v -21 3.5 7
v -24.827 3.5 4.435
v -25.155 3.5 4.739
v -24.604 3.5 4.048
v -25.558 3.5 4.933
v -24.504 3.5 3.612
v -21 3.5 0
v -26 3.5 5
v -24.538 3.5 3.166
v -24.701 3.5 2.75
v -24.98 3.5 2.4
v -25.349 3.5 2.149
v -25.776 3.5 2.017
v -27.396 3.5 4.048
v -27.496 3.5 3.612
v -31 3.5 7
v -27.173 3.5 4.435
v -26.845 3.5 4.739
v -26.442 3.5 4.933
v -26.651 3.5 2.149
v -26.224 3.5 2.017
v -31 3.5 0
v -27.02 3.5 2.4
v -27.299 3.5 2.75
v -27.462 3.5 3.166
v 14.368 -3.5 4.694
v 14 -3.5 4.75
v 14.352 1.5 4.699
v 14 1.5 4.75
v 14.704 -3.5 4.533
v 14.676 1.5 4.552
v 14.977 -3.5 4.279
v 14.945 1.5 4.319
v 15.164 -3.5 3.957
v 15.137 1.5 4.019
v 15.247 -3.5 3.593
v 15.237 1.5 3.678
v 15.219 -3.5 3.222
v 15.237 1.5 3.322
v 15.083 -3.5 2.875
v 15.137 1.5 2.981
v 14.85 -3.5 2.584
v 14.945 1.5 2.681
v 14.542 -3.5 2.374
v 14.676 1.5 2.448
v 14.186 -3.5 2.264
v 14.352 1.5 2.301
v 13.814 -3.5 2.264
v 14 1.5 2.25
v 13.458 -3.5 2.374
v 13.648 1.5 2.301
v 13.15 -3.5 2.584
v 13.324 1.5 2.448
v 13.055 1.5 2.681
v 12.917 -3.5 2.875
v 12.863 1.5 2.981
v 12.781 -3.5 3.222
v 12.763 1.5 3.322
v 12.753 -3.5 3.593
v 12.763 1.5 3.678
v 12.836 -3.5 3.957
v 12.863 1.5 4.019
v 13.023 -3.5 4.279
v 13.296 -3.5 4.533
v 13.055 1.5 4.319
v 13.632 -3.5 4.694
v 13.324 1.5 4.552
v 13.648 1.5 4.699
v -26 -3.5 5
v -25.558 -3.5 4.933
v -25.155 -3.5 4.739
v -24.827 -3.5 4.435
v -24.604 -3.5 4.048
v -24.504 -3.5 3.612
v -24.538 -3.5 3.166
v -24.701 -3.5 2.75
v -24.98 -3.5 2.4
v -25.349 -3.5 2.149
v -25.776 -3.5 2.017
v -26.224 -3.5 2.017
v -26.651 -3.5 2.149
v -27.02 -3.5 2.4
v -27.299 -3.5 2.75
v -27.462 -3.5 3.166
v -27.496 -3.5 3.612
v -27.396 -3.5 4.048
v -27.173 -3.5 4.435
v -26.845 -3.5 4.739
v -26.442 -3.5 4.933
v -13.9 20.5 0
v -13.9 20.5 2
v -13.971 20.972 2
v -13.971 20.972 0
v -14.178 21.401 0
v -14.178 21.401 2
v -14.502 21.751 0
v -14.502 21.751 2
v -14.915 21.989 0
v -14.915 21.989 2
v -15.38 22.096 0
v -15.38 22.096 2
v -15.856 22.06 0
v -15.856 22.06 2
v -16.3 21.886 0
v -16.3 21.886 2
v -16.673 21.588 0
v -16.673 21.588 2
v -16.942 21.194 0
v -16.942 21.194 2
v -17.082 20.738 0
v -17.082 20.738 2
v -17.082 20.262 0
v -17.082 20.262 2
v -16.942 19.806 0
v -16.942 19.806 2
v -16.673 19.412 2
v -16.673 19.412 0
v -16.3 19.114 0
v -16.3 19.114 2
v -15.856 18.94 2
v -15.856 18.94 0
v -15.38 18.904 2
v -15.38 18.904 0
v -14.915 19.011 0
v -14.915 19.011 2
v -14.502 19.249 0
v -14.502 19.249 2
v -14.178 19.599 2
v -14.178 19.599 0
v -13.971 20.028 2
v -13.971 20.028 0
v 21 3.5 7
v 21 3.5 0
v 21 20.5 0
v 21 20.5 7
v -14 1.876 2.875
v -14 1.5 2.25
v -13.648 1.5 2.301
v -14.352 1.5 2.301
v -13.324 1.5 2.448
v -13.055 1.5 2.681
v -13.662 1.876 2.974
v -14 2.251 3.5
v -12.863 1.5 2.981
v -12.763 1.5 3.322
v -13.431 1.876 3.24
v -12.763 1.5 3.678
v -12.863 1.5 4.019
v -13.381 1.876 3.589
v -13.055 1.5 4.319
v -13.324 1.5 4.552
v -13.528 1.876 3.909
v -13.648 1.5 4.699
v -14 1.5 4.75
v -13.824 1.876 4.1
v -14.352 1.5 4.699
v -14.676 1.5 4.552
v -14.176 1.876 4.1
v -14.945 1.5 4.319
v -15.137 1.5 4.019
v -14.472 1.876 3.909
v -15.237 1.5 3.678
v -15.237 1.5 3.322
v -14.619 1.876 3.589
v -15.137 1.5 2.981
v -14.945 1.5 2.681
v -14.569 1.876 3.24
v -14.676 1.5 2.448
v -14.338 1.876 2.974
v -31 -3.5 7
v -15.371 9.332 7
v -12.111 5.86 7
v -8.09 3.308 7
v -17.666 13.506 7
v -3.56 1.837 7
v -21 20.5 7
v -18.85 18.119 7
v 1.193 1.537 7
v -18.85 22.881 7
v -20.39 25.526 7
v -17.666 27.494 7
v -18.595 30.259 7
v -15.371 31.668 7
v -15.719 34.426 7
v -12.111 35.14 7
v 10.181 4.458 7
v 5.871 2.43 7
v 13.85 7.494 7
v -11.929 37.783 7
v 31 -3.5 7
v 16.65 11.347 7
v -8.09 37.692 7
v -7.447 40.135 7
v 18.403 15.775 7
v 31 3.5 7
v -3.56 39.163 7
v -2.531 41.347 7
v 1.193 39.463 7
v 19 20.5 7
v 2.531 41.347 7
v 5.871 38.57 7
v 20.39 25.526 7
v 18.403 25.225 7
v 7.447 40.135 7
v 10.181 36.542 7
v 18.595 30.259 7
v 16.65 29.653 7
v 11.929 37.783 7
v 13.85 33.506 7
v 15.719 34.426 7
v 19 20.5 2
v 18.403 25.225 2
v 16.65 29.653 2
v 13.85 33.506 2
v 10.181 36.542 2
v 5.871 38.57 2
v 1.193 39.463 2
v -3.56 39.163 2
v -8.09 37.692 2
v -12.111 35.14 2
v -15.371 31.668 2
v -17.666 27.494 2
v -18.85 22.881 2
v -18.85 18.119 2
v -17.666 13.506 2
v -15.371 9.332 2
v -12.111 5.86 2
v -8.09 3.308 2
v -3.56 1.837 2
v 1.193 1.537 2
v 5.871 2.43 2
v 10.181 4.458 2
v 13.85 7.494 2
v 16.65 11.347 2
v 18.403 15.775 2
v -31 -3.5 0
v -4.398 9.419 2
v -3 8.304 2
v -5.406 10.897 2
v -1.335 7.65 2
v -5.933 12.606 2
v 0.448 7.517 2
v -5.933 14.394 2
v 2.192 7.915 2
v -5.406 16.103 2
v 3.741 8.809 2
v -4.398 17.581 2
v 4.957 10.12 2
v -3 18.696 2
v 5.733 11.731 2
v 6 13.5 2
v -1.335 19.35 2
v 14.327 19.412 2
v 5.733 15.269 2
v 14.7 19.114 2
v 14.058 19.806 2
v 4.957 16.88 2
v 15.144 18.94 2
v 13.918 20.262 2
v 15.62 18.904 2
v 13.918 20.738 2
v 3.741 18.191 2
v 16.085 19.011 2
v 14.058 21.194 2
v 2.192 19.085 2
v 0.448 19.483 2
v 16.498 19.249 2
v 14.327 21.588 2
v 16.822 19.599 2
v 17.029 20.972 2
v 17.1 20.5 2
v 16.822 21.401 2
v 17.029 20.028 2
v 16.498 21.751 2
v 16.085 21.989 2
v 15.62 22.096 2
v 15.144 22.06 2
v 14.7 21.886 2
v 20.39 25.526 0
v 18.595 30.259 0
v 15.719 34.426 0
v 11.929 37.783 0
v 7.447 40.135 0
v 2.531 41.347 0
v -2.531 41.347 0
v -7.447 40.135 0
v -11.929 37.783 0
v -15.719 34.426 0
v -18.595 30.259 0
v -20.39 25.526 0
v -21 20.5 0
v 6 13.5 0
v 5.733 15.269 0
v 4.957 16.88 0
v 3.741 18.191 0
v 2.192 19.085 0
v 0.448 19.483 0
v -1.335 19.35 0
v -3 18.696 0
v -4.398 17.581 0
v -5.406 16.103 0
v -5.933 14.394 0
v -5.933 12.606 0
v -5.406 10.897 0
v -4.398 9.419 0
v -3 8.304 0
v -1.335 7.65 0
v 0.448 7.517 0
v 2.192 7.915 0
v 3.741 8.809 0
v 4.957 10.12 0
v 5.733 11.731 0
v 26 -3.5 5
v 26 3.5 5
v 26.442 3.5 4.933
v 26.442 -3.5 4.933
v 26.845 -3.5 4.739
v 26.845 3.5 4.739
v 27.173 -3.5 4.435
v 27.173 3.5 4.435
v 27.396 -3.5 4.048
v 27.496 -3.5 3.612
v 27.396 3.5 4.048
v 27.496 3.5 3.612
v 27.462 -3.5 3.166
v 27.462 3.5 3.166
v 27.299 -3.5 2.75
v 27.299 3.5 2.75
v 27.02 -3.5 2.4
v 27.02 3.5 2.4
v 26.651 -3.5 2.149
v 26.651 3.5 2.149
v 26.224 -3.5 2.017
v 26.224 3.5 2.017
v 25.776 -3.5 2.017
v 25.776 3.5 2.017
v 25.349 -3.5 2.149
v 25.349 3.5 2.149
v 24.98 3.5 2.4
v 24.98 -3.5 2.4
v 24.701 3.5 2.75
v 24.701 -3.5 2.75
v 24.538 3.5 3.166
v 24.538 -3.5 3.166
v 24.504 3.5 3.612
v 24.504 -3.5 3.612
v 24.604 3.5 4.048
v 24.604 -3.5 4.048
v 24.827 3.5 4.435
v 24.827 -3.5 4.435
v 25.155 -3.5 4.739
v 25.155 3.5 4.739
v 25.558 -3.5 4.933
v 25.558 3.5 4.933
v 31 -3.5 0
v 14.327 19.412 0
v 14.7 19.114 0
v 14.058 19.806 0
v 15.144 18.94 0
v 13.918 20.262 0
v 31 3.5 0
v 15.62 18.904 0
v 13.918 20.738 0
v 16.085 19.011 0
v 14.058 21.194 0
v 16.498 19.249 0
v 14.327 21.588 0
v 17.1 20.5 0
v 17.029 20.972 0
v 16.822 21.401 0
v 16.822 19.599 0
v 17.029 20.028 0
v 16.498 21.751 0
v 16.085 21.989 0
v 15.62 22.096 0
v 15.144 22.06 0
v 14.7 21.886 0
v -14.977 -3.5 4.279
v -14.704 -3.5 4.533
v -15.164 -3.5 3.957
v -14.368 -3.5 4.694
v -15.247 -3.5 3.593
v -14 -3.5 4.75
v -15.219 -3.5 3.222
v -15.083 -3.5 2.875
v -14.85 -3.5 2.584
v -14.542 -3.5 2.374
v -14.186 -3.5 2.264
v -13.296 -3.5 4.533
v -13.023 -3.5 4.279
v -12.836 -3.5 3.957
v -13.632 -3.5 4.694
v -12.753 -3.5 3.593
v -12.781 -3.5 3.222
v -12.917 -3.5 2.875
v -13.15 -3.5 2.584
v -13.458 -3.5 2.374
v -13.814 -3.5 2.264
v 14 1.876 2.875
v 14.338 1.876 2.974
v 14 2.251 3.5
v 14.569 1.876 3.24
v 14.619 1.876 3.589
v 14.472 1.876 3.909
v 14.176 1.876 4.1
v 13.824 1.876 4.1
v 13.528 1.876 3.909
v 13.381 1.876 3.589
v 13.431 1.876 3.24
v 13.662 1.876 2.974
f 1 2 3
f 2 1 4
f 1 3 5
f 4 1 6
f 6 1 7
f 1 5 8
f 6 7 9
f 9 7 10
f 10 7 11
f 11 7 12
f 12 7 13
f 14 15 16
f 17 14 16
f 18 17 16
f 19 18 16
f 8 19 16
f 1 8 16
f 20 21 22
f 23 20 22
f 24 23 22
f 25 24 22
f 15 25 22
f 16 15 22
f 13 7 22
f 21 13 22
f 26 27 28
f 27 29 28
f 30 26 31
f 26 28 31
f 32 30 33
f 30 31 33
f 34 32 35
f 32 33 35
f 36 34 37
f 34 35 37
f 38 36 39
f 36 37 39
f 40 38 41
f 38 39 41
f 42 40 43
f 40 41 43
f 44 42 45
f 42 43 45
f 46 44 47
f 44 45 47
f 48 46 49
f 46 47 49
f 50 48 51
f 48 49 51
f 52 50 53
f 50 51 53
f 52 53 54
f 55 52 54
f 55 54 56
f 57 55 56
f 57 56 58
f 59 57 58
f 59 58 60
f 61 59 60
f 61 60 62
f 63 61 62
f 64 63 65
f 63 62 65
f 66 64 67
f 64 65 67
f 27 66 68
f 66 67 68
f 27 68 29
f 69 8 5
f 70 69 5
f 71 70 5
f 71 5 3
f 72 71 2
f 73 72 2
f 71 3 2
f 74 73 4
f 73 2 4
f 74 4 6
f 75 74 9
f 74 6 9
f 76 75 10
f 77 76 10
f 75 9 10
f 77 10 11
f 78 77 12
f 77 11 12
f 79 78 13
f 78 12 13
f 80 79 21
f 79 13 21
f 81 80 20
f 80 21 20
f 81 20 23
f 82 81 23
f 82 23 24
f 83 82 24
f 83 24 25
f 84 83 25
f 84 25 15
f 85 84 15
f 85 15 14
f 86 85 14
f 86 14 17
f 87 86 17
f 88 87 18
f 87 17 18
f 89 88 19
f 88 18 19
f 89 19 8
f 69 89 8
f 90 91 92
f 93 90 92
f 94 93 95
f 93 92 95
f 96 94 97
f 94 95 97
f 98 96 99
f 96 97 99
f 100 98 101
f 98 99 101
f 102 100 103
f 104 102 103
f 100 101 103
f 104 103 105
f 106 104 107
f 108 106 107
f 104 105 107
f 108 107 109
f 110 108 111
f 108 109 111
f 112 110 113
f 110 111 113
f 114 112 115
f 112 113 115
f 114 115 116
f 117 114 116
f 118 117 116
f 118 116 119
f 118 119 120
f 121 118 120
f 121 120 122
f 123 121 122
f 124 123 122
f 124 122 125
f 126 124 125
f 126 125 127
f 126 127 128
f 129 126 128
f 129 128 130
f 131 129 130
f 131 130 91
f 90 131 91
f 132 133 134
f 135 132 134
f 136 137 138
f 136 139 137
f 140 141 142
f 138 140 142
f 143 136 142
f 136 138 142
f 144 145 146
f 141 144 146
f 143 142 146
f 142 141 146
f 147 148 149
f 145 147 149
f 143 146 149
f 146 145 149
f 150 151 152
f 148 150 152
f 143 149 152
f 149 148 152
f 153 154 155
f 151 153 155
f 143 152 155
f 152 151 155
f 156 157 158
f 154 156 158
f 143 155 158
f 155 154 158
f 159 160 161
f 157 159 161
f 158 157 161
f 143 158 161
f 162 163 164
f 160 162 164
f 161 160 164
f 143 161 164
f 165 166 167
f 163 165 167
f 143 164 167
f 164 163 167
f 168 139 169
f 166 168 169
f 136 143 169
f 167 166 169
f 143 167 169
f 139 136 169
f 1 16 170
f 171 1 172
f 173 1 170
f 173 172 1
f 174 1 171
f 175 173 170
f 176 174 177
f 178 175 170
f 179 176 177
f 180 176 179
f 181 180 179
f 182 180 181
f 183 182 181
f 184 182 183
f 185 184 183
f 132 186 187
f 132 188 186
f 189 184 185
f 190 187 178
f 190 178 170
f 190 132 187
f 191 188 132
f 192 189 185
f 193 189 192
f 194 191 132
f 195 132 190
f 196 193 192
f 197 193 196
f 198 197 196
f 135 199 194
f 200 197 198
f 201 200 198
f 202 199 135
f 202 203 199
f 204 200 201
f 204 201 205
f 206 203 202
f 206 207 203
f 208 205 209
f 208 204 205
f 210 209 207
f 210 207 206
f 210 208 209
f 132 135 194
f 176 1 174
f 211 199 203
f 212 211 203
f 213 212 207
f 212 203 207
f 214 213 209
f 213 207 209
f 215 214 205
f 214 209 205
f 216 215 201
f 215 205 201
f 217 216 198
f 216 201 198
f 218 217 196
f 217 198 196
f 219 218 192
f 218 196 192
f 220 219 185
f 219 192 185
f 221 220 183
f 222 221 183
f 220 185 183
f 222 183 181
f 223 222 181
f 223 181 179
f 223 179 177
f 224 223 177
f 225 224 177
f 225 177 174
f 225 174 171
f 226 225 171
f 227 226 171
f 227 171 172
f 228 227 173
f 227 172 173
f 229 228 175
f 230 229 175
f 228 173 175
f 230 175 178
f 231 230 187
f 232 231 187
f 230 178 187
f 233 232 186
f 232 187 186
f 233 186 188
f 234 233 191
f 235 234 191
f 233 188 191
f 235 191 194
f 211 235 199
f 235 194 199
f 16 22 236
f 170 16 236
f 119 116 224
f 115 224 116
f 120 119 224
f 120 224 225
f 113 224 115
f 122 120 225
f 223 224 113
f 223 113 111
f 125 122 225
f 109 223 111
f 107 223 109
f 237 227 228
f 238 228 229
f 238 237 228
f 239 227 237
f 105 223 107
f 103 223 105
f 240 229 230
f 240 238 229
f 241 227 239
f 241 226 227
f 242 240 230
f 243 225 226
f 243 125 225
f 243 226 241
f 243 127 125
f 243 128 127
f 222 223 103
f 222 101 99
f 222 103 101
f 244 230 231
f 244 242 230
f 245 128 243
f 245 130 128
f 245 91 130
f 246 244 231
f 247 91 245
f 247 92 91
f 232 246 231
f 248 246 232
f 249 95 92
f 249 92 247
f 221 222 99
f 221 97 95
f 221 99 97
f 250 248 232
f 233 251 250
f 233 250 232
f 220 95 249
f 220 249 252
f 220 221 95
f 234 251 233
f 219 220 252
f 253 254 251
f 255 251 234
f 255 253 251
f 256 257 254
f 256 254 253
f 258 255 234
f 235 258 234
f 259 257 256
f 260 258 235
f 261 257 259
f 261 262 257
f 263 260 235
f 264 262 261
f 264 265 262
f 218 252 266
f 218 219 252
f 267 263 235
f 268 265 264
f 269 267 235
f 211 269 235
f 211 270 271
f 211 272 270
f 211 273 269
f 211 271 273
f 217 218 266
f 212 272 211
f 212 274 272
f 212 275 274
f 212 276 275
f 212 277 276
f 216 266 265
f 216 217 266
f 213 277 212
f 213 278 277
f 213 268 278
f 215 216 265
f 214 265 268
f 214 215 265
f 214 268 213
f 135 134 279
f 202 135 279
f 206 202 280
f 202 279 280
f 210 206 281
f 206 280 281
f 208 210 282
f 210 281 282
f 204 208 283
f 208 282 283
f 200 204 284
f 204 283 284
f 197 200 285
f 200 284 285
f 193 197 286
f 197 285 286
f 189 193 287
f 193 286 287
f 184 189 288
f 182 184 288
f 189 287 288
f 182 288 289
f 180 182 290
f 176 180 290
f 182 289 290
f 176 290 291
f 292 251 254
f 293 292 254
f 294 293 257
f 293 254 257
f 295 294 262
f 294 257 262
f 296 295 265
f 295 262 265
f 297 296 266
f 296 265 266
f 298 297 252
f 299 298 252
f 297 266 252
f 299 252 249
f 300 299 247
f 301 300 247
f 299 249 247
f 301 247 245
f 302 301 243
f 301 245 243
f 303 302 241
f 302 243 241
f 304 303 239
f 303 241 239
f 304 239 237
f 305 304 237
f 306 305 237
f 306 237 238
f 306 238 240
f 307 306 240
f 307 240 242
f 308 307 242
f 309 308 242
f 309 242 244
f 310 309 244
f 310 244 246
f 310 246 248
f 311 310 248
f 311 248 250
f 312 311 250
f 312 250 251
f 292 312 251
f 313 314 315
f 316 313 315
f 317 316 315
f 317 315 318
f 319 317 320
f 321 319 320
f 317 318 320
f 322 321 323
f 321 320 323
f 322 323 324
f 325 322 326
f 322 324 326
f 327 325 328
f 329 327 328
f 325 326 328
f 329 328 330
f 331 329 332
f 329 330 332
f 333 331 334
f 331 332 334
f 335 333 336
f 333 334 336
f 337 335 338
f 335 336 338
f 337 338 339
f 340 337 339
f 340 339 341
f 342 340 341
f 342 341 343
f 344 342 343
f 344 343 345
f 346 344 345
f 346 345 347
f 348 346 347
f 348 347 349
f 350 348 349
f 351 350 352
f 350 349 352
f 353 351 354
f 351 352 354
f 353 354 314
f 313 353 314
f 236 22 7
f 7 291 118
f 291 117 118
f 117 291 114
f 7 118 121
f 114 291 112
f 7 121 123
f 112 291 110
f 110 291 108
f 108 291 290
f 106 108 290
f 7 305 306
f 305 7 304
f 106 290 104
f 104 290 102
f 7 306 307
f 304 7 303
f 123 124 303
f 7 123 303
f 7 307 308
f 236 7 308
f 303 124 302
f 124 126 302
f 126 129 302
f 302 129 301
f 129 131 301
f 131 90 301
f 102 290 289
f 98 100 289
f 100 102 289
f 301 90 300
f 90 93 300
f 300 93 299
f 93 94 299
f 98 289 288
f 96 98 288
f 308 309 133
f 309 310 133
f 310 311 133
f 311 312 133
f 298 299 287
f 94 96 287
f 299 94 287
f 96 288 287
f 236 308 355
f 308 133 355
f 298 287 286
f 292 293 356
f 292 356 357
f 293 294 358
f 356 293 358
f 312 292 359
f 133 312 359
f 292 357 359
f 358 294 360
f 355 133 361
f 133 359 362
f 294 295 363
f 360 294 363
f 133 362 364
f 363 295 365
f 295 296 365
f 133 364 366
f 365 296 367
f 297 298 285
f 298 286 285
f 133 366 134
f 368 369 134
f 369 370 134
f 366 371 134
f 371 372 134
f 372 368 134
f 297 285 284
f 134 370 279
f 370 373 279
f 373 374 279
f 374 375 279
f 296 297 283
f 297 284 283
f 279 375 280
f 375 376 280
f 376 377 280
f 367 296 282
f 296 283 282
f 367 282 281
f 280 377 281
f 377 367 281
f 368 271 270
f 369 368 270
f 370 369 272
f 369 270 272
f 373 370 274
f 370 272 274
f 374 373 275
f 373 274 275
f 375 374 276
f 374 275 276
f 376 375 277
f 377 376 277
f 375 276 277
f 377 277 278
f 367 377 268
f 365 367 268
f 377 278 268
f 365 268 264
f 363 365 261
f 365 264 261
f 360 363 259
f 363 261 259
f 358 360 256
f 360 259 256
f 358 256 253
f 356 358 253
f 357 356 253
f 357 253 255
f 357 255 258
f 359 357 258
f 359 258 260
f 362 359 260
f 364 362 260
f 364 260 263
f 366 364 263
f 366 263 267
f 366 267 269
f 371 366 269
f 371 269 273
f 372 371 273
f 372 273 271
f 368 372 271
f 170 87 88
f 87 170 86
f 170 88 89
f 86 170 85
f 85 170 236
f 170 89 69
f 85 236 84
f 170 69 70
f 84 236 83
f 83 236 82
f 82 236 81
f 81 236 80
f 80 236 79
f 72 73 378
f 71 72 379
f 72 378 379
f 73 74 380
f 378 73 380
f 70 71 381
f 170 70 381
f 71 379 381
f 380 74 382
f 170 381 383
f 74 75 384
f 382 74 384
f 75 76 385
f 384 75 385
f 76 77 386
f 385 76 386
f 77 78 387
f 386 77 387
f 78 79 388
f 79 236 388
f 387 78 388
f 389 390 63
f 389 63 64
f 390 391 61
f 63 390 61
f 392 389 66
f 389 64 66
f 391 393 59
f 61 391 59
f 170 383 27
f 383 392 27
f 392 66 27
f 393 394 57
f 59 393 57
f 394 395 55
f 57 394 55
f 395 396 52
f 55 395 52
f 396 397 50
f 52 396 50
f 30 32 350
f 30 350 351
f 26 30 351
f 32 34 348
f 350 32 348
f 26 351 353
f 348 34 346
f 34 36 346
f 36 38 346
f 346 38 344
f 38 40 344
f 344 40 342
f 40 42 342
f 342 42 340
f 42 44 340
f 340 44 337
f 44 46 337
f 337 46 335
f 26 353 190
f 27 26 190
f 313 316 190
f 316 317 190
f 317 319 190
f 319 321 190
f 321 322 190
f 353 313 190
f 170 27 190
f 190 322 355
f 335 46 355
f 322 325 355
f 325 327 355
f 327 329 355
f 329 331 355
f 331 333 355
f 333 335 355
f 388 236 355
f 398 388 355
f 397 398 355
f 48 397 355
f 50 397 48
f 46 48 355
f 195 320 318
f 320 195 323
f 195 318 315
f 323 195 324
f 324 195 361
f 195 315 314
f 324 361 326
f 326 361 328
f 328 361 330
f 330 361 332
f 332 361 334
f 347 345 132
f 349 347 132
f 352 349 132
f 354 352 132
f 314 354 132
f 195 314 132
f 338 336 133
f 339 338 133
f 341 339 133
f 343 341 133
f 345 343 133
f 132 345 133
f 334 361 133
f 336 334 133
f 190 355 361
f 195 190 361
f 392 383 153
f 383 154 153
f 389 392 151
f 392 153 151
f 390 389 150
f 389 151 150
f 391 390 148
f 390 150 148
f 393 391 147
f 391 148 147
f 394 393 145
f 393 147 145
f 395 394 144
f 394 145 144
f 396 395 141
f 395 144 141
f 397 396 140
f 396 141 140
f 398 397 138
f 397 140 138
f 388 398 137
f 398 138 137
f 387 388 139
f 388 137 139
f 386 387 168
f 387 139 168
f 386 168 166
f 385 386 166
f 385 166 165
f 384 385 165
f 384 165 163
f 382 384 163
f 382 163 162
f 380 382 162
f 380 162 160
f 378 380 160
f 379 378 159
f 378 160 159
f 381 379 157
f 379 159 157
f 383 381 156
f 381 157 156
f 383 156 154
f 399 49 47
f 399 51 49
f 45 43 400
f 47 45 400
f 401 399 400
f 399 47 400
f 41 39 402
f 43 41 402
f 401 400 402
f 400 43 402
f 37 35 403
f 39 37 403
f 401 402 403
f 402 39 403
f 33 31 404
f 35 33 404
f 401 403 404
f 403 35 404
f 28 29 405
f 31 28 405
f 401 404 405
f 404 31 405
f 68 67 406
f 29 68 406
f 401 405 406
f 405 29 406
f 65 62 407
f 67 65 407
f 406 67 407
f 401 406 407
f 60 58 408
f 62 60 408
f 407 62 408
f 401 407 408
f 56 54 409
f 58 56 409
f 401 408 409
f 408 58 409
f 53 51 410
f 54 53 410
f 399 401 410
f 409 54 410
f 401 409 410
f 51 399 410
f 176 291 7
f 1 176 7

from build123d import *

# Parameters (mm, degrees)
BOSS_EXTRUDE1_DEPTH   = 7
SKETCH2_R             = 19
CUT_EXTRUDE1_DEPTH    = 5
SKETCH3_R             = 6
SKETCH3_R_2           = 1.6
CUT_EXTRUDE2_DEPTH    = 5
M3_TAPPED_HOLE1_D     = 2.5
M3_TAPPED_HOLE1_DEPTH = 5
M3_TAPPED_HOLE1_TIP   = 0.751075774
SKETCH6_R             = 1.5
CUT_EXTRUDE3_DEPTH    = 7


with BuildPart() as part:
    # Sketch1 → Boss-Extrude1 (new body)
    with BuildSketch(Plane.XY):
        with BuildLine():
            Line((31, 3.5), (21, 3.5))
            Line((21, 3.5), (21, 20.5))
            ThreePointArc((21, 20.5), (0, 41.5), (-21, 20.5))
            Line((-21, 20.5), (-21, 3.5))
            Line((-21, 3.5), (-31, 3.5))
            Line((-31, 3.5), (-31, -3.5))
            Line((-31, -3.5), (31, -3.5))
            Line((31, -3.5), (31, 3.5))
        make_face()
    extrude(amount=BOSS_EXTRUDE1_DEPTH)

    # Sketch2 → Cut-Extrude1 (cut)
    with BuildSketch(Plane.XY.offset(7)):
        with Locations((0, 20.5)):
            Circle(SKETCH2_R)
    extrude(amount=-CUT_EXTRUDE1_DEPTH, mode=Mode.SUBTRACT)

    # Sketch3 → Cut-Extrude2 (cut)
    with BuildSketch(Plane.XY.offset(2)):
        with Locations((0, 13.5)):
            Circle(SKETCH3_R)
        with Locations((15.5, 20.5)):
            Circle(SKETCH3_R_2)
        with Locations((-15.5, 20.5)):
            Circle(SKETCH3_R_2)
    extrude(amount=-CUT_EXTRUDE2_DEPTH, mode=Mode.SUBTRACT)

    # M3 Tapped Hole1
    with Locations(Plane(origin=(-14, -3.5, 3.5), x_dir=(0, 0, -1), z_dir=(0, -1, 0))):
        with Locations((0, 0), (0, 28)):
            Hole(M3_TAPPED_HOLE1_D / 2, depth=M3_TAPPED_HOLE1_DEPTH)
            with Locations((0, 0, -(M3_TAPPED_HOLE1_DEPTH + M3_TAPPED_HOLE1_TIP / 2))):  # 118° drill point
                Cone(0, M3_TAPPED_HOLE1_D / 2, M3_TAPPED_HOLE1_TIP, mode=Mode.SUBTRACT)

    # Sketch6 → Cut-Extrude3 (cut)
    with BuildSketch(Plane(origin=(0, 3.5, 0), x_dir=(1, 0, 0), z_dir=(0, 1, 0))):
        with Locations(Location((-26, -3.5, 0), (0, 0, 270))):
            Circle(SKETCH6_R)
        with Locations(Location((26, -3.5, 0), (0, 0, 270))):
            Circle(SKETCH6_R)
    extrude(amount=-CUT_EXTRUDE3_DEPTH, mode=Mode.SUBTRACT)


solid = part.part
